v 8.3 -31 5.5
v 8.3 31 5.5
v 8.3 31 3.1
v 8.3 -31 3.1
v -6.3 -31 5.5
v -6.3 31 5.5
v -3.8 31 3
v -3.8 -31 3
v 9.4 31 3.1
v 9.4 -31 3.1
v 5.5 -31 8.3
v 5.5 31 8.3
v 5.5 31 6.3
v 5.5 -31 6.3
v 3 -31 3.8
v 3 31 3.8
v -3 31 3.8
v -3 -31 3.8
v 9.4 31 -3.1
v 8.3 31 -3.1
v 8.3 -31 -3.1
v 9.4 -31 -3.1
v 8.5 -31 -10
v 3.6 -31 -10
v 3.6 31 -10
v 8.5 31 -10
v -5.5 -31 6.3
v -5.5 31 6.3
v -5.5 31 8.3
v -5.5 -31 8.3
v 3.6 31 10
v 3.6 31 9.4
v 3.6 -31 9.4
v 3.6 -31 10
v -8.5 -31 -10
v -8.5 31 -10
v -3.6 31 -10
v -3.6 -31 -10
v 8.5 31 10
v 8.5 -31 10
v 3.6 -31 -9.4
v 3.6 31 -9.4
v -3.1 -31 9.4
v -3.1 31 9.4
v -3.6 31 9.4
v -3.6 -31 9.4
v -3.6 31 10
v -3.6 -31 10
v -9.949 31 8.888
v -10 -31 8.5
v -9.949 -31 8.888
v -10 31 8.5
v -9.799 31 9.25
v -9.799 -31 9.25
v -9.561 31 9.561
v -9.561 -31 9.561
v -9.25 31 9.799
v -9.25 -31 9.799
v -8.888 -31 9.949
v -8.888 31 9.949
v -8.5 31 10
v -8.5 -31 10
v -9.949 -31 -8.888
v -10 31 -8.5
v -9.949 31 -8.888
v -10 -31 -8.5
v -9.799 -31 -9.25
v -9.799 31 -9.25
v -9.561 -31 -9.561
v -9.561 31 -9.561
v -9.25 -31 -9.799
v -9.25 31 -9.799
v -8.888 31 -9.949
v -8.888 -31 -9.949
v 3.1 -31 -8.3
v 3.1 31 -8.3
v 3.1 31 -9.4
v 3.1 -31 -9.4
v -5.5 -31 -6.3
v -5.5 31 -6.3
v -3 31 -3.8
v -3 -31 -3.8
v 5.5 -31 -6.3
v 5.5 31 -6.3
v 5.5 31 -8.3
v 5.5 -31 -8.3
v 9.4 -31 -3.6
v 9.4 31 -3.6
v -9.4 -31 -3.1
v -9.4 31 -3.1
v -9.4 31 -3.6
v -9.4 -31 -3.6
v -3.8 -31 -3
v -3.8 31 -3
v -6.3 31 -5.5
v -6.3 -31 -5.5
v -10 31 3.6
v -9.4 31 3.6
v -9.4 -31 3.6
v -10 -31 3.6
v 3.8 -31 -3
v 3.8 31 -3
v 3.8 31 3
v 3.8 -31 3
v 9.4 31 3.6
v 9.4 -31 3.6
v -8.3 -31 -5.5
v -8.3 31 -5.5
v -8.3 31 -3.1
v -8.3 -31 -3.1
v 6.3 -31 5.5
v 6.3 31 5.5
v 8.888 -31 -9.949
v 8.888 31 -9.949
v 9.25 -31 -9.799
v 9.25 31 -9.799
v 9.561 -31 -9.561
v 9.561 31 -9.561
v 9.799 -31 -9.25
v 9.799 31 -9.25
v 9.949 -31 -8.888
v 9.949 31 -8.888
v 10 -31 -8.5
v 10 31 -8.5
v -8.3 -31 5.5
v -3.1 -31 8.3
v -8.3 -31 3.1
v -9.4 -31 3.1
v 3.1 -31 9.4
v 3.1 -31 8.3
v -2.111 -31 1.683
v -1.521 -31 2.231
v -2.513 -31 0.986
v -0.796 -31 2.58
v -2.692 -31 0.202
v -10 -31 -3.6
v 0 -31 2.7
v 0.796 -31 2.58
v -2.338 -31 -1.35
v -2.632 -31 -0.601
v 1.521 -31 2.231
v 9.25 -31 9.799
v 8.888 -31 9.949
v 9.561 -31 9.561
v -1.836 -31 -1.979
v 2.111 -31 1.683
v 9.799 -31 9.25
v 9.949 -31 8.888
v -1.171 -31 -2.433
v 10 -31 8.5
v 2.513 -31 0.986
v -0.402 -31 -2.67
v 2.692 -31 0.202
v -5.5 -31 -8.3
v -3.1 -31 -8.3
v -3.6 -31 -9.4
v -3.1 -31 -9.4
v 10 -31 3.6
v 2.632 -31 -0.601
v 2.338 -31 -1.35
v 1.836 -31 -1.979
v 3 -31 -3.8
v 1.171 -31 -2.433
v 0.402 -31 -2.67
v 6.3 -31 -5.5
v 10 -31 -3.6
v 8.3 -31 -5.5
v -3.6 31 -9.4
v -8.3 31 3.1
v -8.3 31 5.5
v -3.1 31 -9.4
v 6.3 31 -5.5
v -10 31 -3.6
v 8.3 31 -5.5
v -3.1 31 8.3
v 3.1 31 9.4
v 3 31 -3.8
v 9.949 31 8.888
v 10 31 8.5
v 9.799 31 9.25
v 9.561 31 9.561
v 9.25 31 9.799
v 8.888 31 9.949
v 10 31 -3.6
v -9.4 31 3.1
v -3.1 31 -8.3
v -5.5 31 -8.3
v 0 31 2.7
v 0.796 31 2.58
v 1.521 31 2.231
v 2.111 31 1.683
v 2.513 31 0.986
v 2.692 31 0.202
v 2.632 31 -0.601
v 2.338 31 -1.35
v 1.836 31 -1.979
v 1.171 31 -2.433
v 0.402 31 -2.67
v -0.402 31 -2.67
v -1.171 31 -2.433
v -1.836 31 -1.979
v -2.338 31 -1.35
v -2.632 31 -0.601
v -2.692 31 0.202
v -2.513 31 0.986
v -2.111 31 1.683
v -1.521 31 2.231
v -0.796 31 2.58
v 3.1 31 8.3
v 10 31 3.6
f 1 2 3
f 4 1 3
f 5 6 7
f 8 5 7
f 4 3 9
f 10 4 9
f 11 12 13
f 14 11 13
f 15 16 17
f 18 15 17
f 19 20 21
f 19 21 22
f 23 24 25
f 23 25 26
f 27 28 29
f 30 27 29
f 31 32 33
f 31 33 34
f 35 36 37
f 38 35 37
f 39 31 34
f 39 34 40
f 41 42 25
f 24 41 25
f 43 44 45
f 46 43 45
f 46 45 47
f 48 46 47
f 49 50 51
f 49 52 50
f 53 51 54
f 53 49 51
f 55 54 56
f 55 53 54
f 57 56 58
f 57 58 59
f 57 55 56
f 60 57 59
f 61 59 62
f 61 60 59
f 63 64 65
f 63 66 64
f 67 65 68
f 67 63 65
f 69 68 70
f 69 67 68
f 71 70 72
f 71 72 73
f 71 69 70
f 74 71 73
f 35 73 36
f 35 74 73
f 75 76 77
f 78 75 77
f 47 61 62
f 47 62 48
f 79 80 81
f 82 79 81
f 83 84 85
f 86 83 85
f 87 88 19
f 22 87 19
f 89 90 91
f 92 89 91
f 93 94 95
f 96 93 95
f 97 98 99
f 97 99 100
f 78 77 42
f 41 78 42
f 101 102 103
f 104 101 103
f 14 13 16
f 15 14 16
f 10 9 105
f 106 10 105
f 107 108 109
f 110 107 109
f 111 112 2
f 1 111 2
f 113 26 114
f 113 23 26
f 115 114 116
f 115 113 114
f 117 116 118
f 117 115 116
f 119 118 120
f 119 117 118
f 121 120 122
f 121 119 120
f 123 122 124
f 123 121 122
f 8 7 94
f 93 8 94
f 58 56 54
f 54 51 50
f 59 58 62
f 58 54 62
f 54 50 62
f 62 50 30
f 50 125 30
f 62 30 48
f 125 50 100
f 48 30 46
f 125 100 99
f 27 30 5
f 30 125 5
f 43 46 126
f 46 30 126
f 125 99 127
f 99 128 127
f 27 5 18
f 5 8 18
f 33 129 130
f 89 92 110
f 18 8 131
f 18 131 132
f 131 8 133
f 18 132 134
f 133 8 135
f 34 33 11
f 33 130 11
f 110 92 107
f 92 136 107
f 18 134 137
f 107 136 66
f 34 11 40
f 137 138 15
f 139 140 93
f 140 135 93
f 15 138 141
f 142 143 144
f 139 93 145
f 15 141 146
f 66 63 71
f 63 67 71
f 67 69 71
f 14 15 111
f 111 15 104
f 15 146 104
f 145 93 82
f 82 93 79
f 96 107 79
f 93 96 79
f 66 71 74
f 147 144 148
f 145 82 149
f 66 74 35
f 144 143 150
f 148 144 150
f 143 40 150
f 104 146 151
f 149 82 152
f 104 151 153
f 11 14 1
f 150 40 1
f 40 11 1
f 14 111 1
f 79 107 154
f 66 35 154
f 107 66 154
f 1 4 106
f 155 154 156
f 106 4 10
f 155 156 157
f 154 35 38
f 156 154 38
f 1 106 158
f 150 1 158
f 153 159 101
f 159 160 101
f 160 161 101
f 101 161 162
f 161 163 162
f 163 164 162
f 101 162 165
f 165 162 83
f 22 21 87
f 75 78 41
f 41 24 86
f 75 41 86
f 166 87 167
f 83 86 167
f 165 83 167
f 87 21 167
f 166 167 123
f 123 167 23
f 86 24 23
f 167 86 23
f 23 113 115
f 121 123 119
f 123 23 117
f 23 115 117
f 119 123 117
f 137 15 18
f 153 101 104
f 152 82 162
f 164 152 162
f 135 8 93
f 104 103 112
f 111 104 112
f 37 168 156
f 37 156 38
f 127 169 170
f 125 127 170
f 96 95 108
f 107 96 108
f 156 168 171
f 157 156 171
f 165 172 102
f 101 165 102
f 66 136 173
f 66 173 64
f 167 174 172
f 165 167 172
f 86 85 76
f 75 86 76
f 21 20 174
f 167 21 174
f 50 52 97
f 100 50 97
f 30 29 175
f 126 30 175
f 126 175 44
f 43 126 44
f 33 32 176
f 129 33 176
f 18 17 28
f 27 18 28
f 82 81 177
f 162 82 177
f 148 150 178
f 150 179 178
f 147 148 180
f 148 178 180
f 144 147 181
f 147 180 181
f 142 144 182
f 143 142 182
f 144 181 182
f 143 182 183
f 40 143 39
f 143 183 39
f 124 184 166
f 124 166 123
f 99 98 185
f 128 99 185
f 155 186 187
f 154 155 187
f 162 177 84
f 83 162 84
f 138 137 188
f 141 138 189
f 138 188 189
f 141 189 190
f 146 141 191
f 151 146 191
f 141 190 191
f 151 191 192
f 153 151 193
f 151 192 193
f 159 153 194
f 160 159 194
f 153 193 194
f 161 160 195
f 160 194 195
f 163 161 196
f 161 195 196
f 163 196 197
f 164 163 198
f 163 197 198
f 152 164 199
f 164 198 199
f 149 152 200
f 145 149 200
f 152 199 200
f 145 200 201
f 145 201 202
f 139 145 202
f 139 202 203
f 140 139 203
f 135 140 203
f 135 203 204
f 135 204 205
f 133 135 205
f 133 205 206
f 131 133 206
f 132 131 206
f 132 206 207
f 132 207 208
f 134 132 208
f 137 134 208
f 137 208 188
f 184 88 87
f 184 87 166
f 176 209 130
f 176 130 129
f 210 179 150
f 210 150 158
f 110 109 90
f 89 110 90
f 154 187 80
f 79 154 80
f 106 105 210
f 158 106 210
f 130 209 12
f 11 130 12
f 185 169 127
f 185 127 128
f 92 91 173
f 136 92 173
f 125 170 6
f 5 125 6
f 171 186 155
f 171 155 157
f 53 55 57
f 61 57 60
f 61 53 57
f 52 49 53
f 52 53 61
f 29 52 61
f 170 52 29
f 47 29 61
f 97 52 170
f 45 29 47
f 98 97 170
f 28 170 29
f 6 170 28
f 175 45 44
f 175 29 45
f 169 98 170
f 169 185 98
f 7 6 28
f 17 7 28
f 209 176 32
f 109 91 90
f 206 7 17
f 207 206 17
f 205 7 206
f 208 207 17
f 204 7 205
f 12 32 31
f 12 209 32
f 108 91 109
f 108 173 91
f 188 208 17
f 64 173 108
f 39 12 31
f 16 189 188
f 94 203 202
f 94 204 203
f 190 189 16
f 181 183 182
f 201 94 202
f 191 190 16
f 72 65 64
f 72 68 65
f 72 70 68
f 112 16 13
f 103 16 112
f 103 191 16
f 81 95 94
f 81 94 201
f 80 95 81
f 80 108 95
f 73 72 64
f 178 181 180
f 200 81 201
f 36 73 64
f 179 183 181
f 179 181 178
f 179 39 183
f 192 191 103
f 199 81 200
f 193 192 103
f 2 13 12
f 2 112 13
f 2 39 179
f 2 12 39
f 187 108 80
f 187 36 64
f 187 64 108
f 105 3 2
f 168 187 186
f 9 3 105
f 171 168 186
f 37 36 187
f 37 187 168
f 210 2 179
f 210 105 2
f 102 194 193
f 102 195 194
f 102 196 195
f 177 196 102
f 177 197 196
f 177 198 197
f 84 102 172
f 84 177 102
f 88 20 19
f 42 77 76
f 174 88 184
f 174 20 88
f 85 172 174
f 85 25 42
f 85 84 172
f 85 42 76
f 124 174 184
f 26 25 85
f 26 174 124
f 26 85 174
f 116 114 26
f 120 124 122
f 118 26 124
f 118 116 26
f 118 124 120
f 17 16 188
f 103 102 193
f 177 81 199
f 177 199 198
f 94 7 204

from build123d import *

# Parameters (mm, degrees)
SKETCH_1_W               = 20
SKETCH_1_H               = 20
EXTRUDE_1_DEPTH          = 31
SKETCH_4_R               = 2.7
CUT_EXTRUDE_3_DEPTH      = 9999
SKETCH_2_W               = 7.2
SKETCH_2_H               = 1.2
SKETCH_2_W_2             = 6.2
SKETCH_2_H_2             = 3.4
CUT_EXTRUDE_1_DEPTH      = 9999
CUT_EXTRUDE_2_DEPTH      = 9999
PATTERN_CIRCULAR_5_COUNT = 4
FILLET_1_R               = 1.5


with BuildPart() as part:
    # 草图1 → 凸台-拉伸1 (new, symmetric)
    with BuildSketch(Plane(origin=(0, 0, 0), x_dir=(1, 0, 0), z_dir=(0, 1, 0))):
        Rectangle(SKETCH_1_W, SKETCH_1_H)
    extrude(amount=EXTRUDE_1_DEPTH, both=True)

    # 草图4 → 切除-拉伸3 (cut)
    with BuildSketch(Plane(origin=(0, 31, 0), x_dir=(1, 0, 0), z_dir=(0, 1, 0))):
        with Locations(Location((0, 0, 0), (0, 0, 270))):
            Circle(SKETCH_4_R)
    extrude(amount=-CUT_EXTRUDE_3_DEPTH, mode=Mode.SUBTRACT)

    # 草图2 → 切除-拉伸1 (cut)
    with BuildSketch(Plane(origin=(0, 31, 0), x_dir=(1, 0, 0), z_dir=(0, 1, 0))):
        with Locations((0, 10)):
            Rectangle(SKETCH_2_W, SKETCH_2_H)
        with Locations((0, 10)):
            Rectangle(SKETCH_2_W_2, SKETCH_2_H_2)
    cut_extrude_1 = extrude(amount=-CUT_EXTRUDE_1_DEPTH, mode=Mode.SUBTRACT)

    # 草图3 → 切除-拉伸2 (cut)
    with BuildSketch(Plane(origin=(0, 31, 0), x_dir=(1, 0, 0), z_dir=(0, 1, 0))):
        Polygon((5.5, 8.3), (-5.5, 8.3), (-5.5, 6.3), (-3, 3.8), (3, 3.8), (5.5, 6.3), align=None)
    cut_extrude_2 = extrude(amount=-CUT_EXTRUDE_2_DEPTH, mode=Mode.SUBTRACT)

    # 阵列(圆周)5: 切除-拉伸1, 切除-拉伸2 ×4 about axis
    pattern_circular_5_axis = Axis((0, 0, 0), (0, 1, 0))
    add([cut_extrude_1.rotate(pattern_circular_5_axis, i * 360 / PATTERN_CIRCULAR_5_COUNT) for i in range(1, PATTERN_CIRCULAR_5_COUNT)], mode=Mode.SUBTRACT)
    add([cut_extrude_2.rotate(pattern_circular_5_axis, i * 360 / PATTERN_CIRCULAR_5_COUNT) for i in range(1, PATTERN_CIRCULAR_5_COUNT)], mode=Mode.SUBTRACT)

    # 圆角1
    fillet_1_edges = [part.edges().sort_by_distance(p)[0] for p in [
        (10, 0, 10),
        (-10, 0, 10),
        (-10, 0, -10),
        (10, 0, -10),
    ]]
    fillet(fillet_1_edges, radius=FILLET_1_R)


solid = part.part
